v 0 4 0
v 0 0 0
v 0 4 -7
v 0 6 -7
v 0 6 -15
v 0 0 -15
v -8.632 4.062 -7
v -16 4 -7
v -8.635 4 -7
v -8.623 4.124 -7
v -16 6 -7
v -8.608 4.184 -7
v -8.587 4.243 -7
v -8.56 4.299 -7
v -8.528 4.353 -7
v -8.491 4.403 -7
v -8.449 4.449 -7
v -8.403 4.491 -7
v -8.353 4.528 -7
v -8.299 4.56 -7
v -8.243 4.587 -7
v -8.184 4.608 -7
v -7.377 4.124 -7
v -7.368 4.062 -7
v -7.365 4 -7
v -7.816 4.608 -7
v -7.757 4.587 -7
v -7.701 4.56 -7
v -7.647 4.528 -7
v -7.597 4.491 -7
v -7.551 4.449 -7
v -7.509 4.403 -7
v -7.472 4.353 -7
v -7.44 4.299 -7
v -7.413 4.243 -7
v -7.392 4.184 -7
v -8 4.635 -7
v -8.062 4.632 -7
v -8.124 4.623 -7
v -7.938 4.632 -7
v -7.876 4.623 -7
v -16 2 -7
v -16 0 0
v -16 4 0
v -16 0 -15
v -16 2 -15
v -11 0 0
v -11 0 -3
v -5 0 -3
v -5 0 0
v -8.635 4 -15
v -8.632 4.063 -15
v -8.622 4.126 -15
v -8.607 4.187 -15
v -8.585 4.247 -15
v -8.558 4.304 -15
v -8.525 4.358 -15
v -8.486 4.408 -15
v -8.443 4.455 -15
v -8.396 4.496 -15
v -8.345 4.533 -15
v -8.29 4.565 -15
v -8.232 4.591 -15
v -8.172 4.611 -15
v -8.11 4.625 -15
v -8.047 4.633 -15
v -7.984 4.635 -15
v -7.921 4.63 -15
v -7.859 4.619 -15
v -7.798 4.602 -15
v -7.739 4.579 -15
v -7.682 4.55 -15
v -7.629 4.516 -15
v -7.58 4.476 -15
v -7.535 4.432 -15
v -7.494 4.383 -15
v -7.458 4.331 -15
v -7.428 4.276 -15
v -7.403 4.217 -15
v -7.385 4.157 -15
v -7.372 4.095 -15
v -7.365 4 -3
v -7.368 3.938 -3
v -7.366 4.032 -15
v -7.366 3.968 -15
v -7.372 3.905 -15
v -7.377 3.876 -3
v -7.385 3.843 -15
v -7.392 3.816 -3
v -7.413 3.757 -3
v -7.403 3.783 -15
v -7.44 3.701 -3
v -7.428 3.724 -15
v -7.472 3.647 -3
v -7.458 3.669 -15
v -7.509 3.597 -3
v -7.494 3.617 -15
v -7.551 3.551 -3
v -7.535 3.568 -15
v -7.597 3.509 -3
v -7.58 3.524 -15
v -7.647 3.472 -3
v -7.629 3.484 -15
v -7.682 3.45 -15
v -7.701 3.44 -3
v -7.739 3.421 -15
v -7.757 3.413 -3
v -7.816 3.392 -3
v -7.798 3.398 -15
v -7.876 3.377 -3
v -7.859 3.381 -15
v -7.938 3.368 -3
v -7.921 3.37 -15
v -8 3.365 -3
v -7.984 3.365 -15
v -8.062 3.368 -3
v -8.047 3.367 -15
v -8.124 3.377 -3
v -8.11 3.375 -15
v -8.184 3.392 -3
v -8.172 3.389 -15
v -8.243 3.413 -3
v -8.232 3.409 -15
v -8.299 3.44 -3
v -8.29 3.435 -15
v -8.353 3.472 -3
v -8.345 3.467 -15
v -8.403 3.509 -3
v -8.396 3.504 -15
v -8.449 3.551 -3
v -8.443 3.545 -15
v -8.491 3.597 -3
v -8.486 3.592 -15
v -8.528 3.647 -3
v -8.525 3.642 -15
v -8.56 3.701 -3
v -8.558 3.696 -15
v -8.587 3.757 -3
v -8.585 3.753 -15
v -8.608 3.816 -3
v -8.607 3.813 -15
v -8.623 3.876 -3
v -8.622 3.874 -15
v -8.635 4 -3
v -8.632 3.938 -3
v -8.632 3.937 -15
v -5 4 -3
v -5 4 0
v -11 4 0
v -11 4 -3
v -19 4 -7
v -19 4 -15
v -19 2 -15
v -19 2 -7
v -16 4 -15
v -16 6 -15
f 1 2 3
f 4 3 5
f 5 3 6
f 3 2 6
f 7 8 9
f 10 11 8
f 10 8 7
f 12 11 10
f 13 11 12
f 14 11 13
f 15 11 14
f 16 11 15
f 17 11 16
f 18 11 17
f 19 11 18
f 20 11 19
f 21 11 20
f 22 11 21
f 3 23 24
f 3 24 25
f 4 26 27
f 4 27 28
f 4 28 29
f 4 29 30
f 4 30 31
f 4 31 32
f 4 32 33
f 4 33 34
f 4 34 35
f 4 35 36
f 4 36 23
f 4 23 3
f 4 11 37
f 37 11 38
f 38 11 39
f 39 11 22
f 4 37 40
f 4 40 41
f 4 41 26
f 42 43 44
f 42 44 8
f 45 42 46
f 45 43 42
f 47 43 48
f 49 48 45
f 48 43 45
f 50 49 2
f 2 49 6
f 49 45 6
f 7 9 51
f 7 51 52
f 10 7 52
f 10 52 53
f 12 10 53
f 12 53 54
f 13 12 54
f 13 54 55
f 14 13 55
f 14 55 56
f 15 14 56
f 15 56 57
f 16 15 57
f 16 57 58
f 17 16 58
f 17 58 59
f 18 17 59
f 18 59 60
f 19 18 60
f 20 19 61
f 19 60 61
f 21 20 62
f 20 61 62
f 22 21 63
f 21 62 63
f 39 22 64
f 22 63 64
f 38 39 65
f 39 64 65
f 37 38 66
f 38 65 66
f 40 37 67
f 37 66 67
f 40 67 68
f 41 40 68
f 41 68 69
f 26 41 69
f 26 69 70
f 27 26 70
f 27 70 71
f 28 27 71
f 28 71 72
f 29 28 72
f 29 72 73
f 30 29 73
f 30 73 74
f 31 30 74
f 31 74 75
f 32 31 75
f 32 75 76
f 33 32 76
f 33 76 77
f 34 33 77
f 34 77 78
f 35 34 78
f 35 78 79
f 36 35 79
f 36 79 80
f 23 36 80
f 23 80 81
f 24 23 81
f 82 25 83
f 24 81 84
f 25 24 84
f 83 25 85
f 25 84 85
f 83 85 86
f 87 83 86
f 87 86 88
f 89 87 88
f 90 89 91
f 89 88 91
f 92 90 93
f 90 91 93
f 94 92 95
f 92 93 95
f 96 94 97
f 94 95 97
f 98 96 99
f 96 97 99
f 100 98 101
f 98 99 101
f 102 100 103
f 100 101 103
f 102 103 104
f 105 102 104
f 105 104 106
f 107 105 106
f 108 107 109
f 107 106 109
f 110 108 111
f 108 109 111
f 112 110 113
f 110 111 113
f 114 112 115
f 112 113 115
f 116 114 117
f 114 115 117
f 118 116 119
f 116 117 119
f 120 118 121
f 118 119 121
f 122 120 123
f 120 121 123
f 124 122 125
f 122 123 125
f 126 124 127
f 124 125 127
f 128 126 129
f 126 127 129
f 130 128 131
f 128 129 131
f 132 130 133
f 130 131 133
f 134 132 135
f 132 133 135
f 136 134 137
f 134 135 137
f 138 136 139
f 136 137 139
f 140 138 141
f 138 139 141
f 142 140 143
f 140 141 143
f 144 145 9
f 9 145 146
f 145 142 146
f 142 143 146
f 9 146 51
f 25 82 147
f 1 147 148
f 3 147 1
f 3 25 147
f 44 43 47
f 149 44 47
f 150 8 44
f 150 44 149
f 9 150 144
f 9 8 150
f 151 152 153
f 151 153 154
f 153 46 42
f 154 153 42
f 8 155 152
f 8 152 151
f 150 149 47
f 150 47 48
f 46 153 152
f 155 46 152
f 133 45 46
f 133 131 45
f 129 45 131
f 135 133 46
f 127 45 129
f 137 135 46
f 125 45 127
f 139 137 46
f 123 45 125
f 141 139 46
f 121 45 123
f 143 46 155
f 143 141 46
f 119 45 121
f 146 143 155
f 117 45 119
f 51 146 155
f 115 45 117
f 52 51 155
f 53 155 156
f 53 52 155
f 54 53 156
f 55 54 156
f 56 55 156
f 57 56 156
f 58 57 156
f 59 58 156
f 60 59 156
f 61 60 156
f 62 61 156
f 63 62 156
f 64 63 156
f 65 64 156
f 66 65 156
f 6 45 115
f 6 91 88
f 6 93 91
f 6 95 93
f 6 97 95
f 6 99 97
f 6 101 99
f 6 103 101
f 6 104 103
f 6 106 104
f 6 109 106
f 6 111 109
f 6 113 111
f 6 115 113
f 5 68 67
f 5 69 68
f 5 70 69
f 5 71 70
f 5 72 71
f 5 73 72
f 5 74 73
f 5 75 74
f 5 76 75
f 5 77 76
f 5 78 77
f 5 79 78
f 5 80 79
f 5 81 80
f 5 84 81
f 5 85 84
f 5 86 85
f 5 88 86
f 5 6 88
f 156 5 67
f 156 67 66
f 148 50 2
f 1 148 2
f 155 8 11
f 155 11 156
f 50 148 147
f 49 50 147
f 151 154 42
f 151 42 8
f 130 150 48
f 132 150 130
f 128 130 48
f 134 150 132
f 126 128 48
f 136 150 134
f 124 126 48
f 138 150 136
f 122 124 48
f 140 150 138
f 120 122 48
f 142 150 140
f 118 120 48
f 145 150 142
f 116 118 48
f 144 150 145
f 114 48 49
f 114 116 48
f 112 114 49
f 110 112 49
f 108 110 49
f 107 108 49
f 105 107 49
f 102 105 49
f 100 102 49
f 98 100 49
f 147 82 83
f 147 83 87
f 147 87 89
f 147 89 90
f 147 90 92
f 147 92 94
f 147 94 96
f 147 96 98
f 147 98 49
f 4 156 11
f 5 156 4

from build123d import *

# Parameters (mm, degrees)
SKETCH2_W           = 15.9999934
SKETCH2_H           = 15
BOSS_EXTRUDE2_DEPTH = 6
SKETCH6_W           = 16
SKETCH6_H           = 7
CUT_EXTRUDE3_DEPTH  = 2
SKETCH7_W           = 6
SKETCH7_H           = 3
CUT_EXTRUDE4_DEPTH  = 23.293492073
SKETCH12_R          = 0.635
CUT_EXTRUDE5_DEPTH  = 100
SKETCH13_W          = 8
SKETCH13_H          = 2
BOSS_EXTRUDE3_DEPTH = 3


with BuildPart() as part:
    # Sketch2 → Boss-Extrude2 (new body)
    with BuildSketch(Plane(origin=(0, 0, 0), x_dir=(1, 0, 0), z_dir=(0, 1, 0))):
        with Locations((-7.9999967, 7.5)):
            Rectangle(SKETCH2_W, SKETCH2_H)
    extrude(amount=BOSS_EXTRUDE2_DEPTH)

    # Sketch6 → Cut-Extrude3 (cut)
    with BuildSketch(Plane(origin=(0, 6, 0), x_dir=(1, 0, 0), z_dir=(0, 1, 0))):
        with Locations((-7.9999934, 3.5)):
            Rectangle(SKETCH6_W, SKETCH6_H)
    extrude(amount=-CUT_EXTRUDE3_DEPTH, mode=Mode.SUBTRACT)

    # Sketch7 → Cut-Extrude4 (cut, through all)
    with BuildSketch(Plane(origin=(0, 4, 0), x_dir=(1, 0, 0), z_dir=(0, 1, 0))):
        with Locations((-8, 1.5)):
            Rectangle(SKETCH7_W, SKETCH7_H)
    extrude(amount=-CUT_EXTRUDE4_DEPTH, mode=Mode.SUBTRACT)

    # Sketch12 → Cut-Extrude5 (cut)
    with BuildSketch(Plane(origin=(0, 0, -15), x_dir=(-1, 0, 0), z_dir=(0, 0, -1))):
        with Locations((7.9999967, 4)):
            Circle(SKETCH12_R)
    extrude(amount=-CUT_EXTRUDE5_DEPTH, mode=Mode.SUBTRACT)

    # Sketch13 → Boss-Extrude3 (add)
    with BuildSketch(Plane.ZY.offset(15.9999934)):
        with Locations((-11, 3)):
            Rectangle(SKETCH13_W, SKETCH13_H)
    extrude(amount=BOSS_EXTRUDE3_DEPTH)


solid = part.part
